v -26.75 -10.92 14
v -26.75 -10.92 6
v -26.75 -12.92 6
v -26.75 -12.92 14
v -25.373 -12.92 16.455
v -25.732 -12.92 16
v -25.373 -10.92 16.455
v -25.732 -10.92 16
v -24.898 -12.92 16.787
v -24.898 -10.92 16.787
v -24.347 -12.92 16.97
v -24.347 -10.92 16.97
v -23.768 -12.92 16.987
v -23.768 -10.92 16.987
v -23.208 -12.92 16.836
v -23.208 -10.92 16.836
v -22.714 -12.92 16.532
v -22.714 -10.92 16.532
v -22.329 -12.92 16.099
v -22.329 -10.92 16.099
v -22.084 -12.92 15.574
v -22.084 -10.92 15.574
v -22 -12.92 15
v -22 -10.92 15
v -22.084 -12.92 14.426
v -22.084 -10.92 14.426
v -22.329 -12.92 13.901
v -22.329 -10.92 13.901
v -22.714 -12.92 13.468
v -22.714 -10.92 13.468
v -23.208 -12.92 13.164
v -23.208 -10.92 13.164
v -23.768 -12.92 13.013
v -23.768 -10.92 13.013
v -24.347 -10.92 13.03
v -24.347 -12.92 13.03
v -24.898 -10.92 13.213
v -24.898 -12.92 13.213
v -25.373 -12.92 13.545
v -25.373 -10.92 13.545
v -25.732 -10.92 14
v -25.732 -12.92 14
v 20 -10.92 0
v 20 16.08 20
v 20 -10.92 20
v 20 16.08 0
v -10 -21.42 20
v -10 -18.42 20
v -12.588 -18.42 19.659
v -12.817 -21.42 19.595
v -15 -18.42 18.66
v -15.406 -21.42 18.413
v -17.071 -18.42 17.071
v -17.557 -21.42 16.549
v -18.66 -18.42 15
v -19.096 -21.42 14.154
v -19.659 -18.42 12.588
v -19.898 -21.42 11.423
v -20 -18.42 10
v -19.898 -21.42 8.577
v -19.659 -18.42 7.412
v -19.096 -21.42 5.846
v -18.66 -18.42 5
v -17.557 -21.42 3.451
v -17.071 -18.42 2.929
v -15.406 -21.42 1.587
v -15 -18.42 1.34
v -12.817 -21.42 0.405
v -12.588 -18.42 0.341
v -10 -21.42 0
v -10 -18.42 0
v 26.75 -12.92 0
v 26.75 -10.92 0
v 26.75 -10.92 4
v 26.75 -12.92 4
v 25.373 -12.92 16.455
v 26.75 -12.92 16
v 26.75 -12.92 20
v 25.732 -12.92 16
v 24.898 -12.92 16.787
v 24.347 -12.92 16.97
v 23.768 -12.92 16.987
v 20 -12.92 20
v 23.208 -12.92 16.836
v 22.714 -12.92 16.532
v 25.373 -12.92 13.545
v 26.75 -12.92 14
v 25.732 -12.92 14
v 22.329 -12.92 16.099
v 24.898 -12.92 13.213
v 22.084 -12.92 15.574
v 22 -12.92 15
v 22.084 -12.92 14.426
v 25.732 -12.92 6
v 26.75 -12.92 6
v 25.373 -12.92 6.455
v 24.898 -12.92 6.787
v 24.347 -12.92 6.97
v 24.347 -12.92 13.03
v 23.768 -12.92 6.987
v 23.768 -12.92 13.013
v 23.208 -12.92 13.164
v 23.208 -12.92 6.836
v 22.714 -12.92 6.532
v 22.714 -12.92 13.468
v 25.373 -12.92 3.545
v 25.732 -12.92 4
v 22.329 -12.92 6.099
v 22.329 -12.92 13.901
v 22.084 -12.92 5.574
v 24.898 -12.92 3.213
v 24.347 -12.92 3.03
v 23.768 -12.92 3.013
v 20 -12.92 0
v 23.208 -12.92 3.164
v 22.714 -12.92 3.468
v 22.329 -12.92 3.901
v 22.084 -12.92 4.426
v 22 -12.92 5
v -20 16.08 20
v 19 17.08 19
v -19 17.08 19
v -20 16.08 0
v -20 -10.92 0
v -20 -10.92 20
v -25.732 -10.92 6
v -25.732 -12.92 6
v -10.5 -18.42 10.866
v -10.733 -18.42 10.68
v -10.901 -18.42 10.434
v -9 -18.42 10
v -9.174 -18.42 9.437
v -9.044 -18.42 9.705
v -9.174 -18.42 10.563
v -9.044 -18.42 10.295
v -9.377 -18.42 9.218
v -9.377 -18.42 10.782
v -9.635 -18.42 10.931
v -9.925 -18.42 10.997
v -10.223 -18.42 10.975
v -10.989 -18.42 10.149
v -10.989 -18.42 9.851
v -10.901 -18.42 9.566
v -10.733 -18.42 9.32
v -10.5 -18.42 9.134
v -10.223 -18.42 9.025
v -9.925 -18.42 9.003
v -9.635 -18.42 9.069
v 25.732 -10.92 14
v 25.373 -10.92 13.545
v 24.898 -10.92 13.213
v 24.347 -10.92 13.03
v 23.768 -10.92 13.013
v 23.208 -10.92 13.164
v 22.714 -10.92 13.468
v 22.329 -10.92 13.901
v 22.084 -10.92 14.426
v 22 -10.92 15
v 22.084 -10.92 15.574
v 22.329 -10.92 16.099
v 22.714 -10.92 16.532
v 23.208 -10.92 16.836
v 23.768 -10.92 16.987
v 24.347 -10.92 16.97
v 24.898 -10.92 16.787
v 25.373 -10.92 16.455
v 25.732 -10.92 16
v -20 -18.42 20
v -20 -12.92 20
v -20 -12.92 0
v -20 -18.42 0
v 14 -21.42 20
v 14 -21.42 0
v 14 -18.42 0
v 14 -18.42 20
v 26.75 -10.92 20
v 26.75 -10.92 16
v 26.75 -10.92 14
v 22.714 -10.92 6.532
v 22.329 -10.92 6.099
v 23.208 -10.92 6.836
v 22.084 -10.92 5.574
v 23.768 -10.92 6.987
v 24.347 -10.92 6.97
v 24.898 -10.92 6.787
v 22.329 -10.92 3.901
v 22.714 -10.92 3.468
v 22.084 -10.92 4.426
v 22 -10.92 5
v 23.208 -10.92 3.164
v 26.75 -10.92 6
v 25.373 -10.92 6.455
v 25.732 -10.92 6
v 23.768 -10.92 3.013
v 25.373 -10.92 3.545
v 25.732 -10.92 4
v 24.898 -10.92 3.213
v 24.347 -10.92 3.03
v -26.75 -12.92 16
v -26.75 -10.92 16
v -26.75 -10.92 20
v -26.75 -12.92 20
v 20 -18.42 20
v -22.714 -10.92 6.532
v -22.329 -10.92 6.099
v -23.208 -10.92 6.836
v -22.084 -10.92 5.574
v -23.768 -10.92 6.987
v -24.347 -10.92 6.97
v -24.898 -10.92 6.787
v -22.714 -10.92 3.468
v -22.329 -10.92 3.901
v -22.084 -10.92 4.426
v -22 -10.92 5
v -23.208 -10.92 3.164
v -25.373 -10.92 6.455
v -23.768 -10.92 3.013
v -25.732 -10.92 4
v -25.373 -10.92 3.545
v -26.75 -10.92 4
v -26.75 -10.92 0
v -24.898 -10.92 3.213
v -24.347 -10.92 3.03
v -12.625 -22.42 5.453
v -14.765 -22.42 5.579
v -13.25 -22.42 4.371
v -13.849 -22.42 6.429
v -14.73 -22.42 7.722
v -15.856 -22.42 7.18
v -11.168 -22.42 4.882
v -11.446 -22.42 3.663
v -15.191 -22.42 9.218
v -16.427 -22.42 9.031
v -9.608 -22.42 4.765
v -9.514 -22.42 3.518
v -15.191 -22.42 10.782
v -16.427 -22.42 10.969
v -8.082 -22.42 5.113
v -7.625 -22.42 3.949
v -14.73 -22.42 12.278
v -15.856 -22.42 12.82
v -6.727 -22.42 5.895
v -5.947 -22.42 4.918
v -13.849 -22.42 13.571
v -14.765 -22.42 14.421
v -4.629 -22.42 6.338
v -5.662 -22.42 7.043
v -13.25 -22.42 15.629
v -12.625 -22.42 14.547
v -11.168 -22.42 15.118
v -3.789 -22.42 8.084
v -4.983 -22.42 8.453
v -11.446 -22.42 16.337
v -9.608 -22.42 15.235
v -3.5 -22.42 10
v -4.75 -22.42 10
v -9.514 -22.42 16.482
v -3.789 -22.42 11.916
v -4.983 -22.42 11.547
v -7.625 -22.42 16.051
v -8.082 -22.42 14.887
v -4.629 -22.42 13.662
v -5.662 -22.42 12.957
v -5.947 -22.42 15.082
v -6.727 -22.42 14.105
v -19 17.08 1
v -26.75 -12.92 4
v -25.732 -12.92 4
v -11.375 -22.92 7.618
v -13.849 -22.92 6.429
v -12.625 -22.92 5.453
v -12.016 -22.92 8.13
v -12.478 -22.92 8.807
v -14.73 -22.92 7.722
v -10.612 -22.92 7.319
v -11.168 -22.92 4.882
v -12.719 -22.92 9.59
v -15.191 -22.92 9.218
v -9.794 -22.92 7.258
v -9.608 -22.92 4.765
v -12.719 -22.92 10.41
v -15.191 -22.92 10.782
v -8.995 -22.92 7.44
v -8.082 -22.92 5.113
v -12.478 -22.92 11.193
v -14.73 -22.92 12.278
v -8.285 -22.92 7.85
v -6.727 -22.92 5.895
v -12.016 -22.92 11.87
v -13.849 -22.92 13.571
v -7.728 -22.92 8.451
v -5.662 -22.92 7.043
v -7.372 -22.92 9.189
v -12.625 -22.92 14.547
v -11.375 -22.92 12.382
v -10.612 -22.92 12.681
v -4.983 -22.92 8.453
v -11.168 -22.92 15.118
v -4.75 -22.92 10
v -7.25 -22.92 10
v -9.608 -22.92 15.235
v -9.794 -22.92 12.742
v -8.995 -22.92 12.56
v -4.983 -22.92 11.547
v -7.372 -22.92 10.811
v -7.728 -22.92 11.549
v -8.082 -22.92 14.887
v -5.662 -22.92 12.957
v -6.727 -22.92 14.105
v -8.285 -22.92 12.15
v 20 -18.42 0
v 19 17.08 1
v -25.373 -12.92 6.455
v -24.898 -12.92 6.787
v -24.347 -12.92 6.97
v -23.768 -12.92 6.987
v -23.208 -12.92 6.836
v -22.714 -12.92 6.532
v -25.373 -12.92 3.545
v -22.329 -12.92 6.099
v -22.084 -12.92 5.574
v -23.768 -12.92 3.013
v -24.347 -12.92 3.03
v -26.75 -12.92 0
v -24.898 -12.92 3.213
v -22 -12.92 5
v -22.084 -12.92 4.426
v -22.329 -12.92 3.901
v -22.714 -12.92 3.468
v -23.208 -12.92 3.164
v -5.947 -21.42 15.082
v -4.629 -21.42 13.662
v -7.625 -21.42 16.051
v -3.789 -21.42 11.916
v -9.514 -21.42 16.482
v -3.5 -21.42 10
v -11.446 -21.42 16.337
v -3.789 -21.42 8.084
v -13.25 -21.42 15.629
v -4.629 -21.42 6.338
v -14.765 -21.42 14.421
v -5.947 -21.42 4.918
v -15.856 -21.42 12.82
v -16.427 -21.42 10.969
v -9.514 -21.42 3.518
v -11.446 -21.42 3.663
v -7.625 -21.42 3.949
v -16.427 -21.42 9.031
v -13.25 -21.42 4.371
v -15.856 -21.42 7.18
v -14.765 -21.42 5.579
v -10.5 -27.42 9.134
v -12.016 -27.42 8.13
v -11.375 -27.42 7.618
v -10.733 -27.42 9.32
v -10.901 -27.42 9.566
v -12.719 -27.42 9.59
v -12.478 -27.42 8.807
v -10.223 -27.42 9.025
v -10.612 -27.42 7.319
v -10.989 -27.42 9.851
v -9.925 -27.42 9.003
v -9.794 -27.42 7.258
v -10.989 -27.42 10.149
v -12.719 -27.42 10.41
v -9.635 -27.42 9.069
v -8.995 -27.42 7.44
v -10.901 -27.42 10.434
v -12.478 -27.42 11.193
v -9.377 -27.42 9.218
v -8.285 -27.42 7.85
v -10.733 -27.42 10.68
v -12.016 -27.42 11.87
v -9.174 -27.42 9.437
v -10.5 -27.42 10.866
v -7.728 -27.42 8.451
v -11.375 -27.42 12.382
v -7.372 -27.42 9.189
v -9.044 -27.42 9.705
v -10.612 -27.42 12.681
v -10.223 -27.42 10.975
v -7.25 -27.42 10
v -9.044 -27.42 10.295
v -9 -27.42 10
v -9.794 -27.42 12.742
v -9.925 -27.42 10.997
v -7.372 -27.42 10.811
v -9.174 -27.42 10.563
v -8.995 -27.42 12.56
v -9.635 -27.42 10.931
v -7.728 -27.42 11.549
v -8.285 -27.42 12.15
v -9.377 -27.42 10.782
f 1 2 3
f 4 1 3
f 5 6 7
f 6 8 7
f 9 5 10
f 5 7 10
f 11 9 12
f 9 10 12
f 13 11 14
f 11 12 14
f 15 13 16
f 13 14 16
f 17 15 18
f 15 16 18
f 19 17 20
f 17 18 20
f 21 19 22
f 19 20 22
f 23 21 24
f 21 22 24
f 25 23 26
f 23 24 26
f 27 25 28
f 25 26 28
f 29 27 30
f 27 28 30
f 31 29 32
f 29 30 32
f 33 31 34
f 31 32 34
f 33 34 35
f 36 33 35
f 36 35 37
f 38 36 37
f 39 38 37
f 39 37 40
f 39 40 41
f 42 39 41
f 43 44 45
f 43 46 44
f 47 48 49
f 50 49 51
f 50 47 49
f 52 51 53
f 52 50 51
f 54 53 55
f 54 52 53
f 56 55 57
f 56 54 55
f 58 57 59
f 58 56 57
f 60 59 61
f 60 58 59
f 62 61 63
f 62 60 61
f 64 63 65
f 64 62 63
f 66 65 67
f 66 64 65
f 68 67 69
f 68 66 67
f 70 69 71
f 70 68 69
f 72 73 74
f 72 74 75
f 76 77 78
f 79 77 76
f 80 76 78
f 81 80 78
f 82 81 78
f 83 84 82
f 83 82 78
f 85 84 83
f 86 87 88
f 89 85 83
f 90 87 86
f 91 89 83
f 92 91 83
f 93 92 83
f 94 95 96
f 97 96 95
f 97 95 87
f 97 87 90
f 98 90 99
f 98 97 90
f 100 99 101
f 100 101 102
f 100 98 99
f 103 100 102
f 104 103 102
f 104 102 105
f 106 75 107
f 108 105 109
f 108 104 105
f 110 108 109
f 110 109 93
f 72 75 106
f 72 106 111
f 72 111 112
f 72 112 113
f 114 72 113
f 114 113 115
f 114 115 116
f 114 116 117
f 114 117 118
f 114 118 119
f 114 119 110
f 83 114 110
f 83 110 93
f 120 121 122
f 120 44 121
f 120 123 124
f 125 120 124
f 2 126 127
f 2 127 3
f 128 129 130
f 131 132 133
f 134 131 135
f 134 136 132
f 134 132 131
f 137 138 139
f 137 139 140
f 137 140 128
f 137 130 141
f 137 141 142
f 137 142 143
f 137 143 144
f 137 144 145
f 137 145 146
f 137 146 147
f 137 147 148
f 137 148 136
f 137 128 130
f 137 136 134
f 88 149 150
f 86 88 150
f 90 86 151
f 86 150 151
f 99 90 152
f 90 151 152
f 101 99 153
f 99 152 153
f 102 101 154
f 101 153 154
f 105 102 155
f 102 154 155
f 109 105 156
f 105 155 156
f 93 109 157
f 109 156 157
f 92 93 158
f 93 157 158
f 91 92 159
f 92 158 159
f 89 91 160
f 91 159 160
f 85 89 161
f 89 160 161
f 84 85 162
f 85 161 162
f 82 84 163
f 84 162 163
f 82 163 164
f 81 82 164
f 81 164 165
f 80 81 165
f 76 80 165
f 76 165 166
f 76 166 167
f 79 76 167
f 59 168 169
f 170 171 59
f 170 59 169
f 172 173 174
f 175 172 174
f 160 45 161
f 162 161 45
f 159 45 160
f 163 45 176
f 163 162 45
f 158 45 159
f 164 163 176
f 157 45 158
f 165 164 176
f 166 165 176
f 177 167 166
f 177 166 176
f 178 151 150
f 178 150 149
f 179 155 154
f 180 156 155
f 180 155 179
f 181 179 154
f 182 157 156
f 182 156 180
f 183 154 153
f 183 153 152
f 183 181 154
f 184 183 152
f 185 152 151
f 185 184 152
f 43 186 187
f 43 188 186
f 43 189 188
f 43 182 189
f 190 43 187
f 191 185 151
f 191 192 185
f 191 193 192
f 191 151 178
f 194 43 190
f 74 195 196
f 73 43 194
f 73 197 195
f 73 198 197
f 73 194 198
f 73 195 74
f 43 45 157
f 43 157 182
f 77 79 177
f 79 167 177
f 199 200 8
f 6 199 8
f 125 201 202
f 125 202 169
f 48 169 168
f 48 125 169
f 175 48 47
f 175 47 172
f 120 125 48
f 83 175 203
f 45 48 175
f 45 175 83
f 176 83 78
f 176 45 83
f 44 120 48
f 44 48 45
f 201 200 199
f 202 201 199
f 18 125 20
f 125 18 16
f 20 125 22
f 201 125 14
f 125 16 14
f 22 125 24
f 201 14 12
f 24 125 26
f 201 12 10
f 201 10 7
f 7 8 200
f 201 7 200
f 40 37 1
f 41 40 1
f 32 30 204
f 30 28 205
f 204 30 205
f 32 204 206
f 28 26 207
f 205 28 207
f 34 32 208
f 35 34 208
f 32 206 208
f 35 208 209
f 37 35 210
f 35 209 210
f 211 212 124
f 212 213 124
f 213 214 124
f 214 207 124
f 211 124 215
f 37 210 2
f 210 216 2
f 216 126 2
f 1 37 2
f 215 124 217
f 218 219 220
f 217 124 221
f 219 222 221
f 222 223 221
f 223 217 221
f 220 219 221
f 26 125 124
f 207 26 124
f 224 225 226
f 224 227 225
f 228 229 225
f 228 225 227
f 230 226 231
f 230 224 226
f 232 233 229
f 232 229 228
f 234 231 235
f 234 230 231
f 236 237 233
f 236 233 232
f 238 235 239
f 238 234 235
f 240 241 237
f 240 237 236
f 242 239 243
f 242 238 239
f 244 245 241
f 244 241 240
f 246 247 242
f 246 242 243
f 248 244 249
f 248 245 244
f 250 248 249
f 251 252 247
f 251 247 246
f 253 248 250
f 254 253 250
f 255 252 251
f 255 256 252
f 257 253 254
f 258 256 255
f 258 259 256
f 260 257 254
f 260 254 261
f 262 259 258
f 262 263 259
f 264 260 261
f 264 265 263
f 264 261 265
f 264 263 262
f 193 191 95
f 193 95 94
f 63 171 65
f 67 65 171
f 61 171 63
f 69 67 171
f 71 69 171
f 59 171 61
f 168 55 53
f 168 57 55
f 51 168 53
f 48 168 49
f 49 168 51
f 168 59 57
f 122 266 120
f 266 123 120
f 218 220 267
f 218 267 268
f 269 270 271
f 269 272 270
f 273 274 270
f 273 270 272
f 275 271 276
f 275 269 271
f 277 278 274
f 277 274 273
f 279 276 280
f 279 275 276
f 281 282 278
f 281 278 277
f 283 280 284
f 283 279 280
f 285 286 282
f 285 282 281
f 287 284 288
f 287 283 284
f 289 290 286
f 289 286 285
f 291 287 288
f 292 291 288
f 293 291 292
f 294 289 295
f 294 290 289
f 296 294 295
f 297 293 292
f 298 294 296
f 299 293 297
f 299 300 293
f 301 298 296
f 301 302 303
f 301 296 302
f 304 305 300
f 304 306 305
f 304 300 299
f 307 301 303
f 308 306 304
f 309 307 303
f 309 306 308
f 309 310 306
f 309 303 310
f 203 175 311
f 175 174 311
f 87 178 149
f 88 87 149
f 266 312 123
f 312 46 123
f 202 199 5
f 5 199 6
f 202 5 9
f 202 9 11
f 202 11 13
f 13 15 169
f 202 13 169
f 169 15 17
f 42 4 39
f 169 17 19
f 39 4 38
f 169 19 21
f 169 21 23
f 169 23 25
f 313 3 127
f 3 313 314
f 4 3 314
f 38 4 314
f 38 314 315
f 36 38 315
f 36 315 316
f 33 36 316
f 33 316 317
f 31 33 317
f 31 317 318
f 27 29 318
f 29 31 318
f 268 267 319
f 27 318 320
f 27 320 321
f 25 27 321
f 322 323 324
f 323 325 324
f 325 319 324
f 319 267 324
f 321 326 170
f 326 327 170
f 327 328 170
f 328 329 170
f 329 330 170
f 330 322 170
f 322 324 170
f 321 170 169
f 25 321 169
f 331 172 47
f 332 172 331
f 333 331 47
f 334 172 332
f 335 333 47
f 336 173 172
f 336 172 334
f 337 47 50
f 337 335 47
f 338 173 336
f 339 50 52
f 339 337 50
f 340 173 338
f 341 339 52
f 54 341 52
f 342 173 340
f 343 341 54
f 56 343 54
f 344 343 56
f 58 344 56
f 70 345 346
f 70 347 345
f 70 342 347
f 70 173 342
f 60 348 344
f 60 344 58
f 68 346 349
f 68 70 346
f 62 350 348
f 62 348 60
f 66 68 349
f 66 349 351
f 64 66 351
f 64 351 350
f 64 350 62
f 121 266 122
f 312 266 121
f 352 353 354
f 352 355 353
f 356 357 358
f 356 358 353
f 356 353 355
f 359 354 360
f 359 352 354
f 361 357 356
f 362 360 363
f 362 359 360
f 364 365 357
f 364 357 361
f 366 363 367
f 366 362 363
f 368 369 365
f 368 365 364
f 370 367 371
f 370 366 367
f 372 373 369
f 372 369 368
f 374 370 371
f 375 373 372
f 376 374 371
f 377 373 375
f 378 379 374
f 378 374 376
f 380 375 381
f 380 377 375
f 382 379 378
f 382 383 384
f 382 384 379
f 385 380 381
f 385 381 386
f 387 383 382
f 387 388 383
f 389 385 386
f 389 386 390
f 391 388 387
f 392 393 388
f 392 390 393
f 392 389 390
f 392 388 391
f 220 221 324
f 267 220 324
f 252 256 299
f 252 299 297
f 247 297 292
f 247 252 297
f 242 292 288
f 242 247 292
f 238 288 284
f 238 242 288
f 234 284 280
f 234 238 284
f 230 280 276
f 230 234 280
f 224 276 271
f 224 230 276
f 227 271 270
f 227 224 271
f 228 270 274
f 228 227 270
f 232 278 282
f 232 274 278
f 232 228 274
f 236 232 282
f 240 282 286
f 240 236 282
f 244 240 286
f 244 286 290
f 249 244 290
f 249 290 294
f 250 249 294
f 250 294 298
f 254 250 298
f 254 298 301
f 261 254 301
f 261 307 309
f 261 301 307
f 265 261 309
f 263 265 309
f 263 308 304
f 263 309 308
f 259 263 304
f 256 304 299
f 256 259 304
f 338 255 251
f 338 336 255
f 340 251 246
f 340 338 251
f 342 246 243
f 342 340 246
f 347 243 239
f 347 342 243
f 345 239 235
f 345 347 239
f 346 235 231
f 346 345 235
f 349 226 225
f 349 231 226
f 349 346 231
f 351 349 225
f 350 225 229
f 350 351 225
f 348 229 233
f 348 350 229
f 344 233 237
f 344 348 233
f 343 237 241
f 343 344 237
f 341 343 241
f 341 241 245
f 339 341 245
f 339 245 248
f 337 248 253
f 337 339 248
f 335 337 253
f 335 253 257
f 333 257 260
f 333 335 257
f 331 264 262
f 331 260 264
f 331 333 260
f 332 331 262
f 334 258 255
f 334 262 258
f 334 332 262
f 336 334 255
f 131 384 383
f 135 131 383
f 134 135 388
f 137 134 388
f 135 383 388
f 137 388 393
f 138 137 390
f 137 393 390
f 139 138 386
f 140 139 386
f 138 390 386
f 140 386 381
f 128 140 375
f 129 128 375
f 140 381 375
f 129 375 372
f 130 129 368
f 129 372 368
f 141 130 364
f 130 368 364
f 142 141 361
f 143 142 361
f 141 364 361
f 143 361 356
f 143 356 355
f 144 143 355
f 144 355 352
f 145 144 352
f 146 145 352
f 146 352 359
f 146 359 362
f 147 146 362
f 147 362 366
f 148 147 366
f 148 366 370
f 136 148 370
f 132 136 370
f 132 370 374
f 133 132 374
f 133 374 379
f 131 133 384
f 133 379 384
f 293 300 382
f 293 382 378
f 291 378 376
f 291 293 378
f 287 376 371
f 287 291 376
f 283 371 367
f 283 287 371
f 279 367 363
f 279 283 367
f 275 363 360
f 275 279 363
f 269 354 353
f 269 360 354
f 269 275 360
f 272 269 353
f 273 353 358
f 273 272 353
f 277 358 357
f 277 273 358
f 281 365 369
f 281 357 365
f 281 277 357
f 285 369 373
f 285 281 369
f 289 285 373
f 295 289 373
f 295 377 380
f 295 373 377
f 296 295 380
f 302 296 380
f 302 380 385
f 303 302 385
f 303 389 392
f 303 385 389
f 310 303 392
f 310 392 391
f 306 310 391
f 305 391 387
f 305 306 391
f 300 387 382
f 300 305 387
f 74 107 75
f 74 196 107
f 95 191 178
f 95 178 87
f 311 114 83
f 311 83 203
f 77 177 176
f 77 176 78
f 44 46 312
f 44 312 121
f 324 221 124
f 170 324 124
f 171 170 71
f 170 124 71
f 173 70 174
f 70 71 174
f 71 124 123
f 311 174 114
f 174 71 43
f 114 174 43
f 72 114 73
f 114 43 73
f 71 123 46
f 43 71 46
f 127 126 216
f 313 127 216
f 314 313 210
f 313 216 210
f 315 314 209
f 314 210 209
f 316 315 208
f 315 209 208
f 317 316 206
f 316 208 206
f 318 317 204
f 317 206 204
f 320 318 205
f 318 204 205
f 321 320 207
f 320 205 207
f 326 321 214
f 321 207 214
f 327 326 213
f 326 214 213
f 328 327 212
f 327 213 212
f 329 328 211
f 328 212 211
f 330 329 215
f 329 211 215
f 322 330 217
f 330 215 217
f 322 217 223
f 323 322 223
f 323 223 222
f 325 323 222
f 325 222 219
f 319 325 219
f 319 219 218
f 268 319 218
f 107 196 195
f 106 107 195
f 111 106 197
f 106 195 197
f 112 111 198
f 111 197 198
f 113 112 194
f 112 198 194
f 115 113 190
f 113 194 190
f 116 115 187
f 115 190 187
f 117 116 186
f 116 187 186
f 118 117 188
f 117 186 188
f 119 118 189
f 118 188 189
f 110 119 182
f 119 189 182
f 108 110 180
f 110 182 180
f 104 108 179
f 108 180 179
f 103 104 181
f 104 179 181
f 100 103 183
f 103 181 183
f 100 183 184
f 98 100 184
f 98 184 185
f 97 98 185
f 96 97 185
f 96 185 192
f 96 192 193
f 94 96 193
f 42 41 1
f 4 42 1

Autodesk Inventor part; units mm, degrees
ref_plane "YZ Plane" through (0, 0, 0) normal (1, 0, 0) x (0, 1, 0)
sketch "Эскиз1" plane through (0, 0, 0) normal (0, 0, 1) x (1, 0, 0)
  line L0 (0, 17.0804) -> (20, 17.0804)
  line L1 (0, 24.5911) -> (0, -44.9718)
  line L2 (14, -21.4196) -> (0, -21.4196)
  line L3 (20, 17.0804) -> (20, -10.9196)
  line L4 (20, -10.9196) -> (26.75, -10.9196)
  line L5 (26.75, -10.9196) -> (26.75, -12.9196)
  line L6 (26.75, -12.9196) -> (20, -12.9196)
  line L7 (20, -12.9196) -> (20, -18.4196)
  line L8 (14, -21.4196) -> (14, -18.4196)
  line L9 (14, -18.4196) -> (20, -18.4196)
  line L10 (0, 17.0804) -> (-20, 17.0804)
  line L11 (-14, -21.4196) -> (0, -21.4196)
  line L12 (-20, 17.0804) -> (-20, -10.9196)
  line L13 (-20, -10.9196) -> (-26.75, -10.9196)
  line L14 (-26.75, -10.9196) -> (-26.75, -12.9196)
  line L15 (-26.75, -12.9196) -> (-20, -12.9196)
  line L16 (-20, -12.9196) -> (-20, -18.4196)
  line L17 (-14, -21.4196) -> (-20, -21.4196)
  line L18 (-20, -21.4196) -> (-20, -18.4196)
  point P0 (0, 0)
  dimension "d14" = 28
  dimension "d15" = 6.75
  dimension "d16" = 2
  dimension "d17" = 6
  dimension "d18" = 3
  dimension "d20" = 20
extrude "Выдавливание1" add sketch "Эскиз1" along normal blind 20
sketch "Эскиз2" plane through (20, -10.9196, 0) normal (0, 1, 0) x (1, 0, 0)
  line L0 (0, 0) -> (0, -20) projected
  line L1 (0, -10) -> (9.888, -10)
  arc A0 (5.7321, -4) -> (5.7321, -6) centre (4, -5) ccw
  line L2 (6.75, 0) -> (6.75, -20) projected
  line L3 (6, -4) -> (6.75, -4)
  line L4 (6, -6) -> (6.75, -6)
  line L5 (6, -4) -> (5.7321, -4)
  line L6 (6, -6) -> (5.7321, -6)
  point P0 (-20, 0)
  dimension "d23" = 4
  dimension "d24" = 3
  dimension "d25" = 2
extrude "Выдавливание2" cut sketch "Эскиз2" against normal through all
ref_plane "РабПлоскость1" through (0, 0, 10) normal (0, 0, 1) x (1, 0, 0)
mirror "Зеркальное отражение2" about plane through (0, 0, 10) normal (0, 0, 1) of "Выдавливание2"
ref_plane "РабПлоскость3" through (0, -10.9196, 0) normal (1, 0, 0) x (0, 0, -1)
mirror "Зеркальное отражение3" about plane through (0, -10.9196, 0) normal (1, 0, 0) of "Выдавливание2", "Зеркальное отражение2"
chamfer "Фаска1" distance 1 angle 45 4 edges at (0, 17.0804, 20) (20, 17.0804, 10) (0, 17.0804, 0) (-20, 17.0804, 10)
sketch "Эскиз3" plane through (-14, -21.4196, 0) normal (0, -1, 0) x (1, 0, 0)
  line L0 (28, 0) -> (28, 20) projected
  line L1 (-6, 0) -> (-6, 20)
  line L2 (-6, 20) -> (34, 20) projected
  circle A0 centre (4, 10) radius 10
  circle A1 centre (4, 10) radius 2.75
  circle A2 centre (4, 10) radius 5.25
  circle A3 centre (4, 10) radius 6.5
  line L3 (-6, 0) -> (-12.75, 0) projected
  line L4 (-6, 0) -> (4, 0)
  line L5 (-6, 20) -> (4, 20)
  line L6 (-6, 20) -> (28, 20) projected
  line L7 (-6, 0) -> (-6, 20) projected
  line L8 (-6, 0) -> (-6, 20)
  point P0 (14, 0)
  point P1 (-6, 10)
  dimension "d39" = 5.5
  dimension "d41" = 10.5
  dimension "d42" = 13
extrude "Выдавливание3" cut sketch "Эскиз3" against normal up to surface (3 mm away) contours L1 A0 L4 | L1 L2 A0
sketch "Эскиз5" plane through (14, -21.4196, 0) normal (0, -1, 0) x (1, 0, 0)
  point P0 (-14, 0)
extrude "Выдавливание4" add sketch "Эскиз3" along normal blind 1 contours A3
extrude "Выдавливание5" add sketch "Эскиз3" along normal blind 1.5 contours A2
extrude "Выдавливание6" add sketch "Эскиз3" along normal blind 6 contours A1
sketch "Эскиз6" plane through (-10, -27.4196, 10) normal (0, -1, 0) x (1, 0, 0)
  circle A0 centre (0, 0) radius 1
  point P0 (10, -10)
  dimension "d52" = 2
extrude "Выдавливание7" cut sketch "Эскиз6" against normal up to surface (9 mm away)
properties part number "Сервопривод"
